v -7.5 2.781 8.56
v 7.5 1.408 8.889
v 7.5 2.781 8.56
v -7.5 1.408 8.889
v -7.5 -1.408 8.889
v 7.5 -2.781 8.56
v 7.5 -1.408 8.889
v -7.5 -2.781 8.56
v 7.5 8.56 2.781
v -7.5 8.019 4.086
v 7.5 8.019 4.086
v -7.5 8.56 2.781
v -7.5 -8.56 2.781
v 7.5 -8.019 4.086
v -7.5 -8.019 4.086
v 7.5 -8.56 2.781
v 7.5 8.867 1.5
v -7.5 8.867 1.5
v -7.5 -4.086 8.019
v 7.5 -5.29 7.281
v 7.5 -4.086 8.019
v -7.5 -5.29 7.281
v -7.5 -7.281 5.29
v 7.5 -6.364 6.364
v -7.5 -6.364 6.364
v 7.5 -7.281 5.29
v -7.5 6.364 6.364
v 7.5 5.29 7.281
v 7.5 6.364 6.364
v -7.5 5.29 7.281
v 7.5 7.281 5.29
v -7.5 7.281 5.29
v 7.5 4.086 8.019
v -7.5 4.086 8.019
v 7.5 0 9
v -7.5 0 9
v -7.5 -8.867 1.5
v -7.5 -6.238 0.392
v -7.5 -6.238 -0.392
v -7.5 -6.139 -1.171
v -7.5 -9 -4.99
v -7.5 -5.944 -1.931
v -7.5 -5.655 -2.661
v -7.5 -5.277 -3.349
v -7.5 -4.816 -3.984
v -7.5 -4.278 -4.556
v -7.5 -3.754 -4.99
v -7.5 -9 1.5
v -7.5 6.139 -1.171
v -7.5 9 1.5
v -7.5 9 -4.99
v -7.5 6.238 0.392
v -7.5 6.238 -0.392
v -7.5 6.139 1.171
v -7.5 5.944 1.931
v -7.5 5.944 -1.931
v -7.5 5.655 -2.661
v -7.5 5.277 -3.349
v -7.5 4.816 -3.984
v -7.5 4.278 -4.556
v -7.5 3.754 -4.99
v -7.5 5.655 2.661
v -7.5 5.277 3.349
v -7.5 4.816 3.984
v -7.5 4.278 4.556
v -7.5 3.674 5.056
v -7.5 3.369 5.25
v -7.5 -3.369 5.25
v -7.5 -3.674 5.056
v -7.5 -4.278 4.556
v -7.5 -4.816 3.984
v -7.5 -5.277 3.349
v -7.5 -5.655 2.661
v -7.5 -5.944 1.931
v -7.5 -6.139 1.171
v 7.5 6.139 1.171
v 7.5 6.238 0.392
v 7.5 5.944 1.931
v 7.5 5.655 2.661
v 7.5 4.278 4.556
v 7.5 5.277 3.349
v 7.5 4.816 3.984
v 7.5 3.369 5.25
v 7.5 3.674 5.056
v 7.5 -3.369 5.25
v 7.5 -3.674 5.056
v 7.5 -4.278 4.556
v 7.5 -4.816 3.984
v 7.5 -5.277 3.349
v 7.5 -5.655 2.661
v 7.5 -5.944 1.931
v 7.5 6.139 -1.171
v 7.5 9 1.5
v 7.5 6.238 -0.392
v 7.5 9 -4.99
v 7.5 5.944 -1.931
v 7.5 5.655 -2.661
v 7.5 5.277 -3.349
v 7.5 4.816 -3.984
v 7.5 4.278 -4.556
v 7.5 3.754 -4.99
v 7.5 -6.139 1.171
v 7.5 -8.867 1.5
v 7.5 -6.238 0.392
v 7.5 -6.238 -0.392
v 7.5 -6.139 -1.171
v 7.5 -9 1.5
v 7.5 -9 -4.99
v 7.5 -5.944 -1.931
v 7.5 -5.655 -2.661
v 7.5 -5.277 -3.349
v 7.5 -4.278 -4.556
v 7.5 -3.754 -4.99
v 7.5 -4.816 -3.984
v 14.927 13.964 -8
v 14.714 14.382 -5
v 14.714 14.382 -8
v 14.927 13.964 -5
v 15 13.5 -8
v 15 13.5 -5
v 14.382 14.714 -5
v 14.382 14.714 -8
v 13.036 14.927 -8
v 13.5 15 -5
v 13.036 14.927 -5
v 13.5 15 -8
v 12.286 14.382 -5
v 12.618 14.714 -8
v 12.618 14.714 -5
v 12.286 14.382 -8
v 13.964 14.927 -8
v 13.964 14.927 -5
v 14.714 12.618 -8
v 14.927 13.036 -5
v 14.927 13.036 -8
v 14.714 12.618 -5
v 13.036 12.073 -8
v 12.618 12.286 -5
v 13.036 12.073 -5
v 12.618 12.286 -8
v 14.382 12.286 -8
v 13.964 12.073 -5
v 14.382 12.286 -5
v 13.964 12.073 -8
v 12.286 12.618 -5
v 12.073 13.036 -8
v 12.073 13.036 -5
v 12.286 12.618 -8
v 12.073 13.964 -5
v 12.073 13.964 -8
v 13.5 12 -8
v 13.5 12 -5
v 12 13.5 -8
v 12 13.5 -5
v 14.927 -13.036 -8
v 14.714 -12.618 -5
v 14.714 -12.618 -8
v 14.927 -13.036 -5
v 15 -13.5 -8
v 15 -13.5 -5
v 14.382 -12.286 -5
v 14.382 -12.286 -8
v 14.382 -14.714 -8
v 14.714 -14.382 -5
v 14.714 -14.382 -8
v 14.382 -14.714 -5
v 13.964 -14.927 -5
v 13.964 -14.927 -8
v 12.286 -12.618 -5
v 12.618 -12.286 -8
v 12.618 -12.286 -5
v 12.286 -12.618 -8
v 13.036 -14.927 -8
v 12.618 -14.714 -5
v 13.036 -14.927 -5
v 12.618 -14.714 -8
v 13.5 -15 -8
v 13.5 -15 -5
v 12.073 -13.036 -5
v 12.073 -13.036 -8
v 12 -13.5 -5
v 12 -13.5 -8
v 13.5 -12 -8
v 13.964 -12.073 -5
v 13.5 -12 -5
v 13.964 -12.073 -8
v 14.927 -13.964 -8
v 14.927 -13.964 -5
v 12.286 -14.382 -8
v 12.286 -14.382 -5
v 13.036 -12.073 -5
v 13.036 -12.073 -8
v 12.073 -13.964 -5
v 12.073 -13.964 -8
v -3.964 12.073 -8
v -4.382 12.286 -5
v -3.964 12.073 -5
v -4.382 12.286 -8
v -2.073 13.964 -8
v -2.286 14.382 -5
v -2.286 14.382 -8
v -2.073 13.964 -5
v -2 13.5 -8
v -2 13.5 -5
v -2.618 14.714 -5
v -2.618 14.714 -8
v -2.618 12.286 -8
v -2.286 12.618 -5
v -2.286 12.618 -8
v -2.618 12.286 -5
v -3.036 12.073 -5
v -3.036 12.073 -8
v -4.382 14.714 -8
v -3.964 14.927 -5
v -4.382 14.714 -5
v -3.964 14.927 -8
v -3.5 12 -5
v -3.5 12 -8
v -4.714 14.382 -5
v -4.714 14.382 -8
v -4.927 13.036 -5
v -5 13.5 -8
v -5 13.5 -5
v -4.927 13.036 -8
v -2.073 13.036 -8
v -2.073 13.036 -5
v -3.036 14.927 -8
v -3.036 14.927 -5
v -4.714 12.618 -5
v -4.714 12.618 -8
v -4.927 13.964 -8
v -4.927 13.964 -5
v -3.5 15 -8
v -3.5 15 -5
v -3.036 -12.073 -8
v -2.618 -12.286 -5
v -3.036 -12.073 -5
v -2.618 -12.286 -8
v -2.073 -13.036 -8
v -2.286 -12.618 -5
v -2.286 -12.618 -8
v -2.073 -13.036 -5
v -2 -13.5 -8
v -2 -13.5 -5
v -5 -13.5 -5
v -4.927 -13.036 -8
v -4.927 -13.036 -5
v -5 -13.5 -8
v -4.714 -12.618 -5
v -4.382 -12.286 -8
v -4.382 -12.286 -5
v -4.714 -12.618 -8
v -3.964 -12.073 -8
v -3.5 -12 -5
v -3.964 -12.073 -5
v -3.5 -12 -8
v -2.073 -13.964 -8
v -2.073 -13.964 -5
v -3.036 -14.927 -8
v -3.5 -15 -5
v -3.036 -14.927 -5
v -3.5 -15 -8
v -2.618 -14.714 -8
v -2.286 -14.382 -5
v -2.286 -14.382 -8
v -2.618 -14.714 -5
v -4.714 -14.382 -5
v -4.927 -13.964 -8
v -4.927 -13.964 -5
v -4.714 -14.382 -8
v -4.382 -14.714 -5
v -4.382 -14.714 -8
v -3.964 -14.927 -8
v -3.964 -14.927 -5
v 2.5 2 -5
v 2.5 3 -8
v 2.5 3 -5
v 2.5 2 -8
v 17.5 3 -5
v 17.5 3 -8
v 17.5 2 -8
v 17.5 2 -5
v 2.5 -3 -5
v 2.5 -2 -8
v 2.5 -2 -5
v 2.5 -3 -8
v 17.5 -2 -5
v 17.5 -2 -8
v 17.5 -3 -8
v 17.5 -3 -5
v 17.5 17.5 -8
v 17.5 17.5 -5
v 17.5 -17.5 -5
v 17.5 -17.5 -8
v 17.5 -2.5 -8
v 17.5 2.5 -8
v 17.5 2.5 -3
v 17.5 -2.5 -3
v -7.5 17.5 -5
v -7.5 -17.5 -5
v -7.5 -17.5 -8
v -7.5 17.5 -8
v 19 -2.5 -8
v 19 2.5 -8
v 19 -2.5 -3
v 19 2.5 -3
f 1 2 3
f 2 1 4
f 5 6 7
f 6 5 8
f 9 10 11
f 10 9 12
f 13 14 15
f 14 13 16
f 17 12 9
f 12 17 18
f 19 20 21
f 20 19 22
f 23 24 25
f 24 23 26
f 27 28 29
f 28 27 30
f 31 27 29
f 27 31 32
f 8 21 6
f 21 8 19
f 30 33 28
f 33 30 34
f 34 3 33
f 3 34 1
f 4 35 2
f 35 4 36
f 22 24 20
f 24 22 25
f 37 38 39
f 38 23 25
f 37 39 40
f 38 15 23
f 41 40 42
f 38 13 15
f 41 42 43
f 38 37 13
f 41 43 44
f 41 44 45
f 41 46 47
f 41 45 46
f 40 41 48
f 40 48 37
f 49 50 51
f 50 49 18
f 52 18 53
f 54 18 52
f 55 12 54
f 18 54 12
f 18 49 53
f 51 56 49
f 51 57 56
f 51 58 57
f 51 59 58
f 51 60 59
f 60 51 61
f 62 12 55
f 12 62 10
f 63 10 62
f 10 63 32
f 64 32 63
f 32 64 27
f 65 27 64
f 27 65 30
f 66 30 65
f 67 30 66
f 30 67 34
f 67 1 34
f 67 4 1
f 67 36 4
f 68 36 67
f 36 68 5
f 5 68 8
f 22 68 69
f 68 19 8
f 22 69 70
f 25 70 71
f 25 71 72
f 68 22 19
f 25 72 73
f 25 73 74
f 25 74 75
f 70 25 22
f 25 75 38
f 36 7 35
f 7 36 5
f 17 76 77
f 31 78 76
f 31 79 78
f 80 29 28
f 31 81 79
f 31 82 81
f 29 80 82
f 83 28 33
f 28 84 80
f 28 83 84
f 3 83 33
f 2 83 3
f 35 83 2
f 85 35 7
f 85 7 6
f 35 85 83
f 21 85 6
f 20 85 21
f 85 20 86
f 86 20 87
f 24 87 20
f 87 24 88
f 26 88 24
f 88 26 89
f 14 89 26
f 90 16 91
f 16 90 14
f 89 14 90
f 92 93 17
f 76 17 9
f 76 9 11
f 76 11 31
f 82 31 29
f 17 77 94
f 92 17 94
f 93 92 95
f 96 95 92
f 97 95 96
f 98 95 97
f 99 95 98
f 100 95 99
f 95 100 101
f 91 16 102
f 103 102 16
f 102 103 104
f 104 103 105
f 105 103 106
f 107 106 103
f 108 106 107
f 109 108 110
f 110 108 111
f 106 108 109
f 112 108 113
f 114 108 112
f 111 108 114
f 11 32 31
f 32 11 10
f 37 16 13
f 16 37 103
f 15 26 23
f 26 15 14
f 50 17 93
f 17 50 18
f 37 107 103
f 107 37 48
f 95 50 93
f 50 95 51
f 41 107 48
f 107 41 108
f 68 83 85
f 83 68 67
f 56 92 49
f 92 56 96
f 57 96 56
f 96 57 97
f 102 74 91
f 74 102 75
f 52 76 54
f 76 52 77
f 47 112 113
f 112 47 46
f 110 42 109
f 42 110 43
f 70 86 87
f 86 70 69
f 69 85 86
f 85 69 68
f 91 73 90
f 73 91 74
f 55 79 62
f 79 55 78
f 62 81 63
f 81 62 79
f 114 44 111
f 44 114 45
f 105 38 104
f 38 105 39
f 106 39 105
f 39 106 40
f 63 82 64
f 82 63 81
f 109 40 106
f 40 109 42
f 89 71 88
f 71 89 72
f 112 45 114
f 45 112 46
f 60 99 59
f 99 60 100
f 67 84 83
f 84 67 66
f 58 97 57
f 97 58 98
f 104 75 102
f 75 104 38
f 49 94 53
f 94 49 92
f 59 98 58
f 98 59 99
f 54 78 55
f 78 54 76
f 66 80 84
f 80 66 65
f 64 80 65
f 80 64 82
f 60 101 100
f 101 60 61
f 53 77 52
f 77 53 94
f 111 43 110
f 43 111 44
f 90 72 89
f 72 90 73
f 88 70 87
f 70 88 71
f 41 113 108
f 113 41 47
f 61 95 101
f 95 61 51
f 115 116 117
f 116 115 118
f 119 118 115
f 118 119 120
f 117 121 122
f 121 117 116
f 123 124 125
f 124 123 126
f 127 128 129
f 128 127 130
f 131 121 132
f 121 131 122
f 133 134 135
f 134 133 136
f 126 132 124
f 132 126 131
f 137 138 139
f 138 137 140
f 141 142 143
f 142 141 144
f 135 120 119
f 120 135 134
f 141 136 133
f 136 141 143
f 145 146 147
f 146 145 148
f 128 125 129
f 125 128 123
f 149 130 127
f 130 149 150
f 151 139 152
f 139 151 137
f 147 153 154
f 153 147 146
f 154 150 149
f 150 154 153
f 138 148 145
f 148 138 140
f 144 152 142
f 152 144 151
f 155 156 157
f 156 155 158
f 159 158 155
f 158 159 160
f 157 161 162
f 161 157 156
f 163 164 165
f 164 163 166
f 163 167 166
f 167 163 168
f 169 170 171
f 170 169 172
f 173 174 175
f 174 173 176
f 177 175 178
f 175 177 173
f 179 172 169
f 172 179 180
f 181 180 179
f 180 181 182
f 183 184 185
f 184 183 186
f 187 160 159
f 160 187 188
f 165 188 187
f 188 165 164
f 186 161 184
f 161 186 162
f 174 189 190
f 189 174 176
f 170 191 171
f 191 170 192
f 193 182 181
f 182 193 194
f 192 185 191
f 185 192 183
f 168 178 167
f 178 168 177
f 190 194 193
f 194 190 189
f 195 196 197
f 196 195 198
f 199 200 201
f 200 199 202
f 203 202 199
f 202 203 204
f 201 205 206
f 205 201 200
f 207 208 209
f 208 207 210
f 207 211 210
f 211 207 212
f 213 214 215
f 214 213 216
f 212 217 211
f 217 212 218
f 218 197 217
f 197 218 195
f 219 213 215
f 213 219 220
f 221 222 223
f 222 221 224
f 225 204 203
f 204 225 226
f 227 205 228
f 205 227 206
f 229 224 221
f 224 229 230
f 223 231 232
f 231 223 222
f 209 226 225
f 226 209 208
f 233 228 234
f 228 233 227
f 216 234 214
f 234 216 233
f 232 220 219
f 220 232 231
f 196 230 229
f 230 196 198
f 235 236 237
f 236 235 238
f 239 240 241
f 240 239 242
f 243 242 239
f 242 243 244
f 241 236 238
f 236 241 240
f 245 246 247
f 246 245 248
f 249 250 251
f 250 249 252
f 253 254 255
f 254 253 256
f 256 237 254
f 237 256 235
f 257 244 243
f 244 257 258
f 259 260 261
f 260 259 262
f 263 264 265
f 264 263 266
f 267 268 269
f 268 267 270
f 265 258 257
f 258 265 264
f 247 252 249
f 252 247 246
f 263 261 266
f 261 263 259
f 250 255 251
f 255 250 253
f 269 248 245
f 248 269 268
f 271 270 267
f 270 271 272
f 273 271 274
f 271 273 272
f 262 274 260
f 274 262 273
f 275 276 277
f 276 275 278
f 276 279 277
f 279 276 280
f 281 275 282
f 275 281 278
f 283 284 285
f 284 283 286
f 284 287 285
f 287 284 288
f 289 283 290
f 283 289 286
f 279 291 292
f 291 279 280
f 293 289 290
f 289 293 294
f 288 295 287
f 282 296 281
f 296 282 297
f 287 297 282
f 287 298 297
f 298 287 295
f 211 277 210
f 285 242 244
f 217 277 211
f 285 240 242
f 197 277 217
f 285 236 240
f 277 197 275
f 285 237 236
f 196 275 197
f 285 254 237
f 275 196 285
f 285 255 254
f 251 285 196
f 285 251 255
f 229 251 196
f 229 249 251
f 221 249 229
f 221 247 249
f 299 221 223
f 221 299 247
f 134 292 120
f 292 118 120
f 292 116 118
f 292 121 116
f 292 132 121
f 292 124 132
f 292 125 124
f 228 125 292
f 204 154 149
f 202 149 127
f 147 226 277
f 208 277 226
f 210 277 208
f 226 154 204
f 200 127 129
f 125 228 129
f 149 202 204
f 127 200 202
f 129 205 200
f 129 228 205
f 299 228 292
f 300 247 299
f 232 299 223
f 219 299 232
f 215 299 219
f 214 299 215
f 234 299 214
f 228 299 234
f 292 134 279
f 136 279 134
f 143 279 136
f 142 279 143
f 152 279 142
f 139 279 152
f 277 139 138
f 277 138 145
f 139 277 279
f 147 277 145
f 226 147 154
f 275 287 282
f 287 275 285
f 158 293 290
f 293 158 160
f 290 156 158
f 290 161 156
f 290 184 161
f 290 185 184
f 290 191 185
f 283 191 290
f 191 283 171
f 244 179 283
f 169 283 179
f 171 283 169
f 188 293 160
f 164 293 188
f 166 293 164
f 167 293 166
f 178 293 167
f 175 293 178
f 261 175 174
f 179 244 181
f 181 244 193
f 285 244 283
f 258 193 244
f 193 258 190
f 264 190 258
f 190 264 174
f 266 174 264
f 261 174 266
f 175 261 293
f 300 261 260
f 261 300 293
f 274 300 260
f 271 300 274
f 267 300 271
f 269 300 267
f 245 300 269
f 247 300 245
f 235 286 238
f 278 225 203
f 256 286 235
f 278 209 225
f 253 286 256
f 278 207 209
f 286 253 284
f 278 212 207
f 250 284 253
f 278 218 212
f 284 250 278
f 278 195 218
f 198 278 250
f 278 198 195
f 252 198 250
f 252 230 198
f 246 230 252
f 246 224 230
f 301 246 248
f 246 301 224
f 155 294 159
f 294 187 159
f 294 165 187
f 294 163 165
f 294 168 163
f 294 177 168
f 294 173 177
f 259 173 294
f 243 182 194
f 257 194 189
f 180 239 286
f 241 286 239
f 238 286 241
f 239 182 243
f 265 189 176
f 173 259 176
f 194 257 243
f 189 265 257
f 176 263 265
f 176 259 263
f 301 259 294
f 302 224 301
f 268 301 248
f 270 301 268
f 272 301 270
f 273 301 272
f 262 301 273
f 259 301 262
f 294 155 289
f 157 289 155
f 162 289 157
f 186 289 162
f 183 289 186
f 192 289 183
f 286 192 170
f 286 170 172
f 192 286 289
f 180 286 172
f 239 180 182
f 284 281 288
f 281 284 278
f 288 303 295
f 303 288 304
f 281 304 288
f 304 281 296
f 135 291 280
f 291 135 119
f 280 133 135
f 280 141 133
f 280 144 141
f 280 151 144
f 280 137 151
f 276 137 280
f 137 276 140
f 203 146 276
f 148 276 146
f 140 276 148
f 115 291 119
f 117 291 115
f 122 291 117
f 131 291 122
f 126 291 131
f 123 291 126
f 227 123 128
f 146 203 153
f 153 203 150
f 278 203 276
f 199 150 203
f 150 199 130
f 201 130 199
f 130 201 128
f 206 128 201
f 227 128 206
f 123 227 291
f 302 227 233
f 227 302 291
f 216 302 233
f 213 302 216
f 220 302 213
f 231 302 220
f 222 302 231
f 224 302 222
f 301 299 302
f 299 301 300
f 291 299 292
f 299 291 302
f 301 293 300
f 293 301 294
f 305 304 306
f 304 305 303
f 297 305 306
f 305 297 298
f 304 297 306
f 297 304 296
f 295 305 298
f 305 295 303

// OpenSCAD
//===============================
//
//  No-tools micro motor mounts
//
//  Designed by Andrew Moore, May 2016
//      http://www.thingiverse.com/TacPar
//
//      For questions, suggestions, or whatever, 
//      please PM me through thingiverse.
//
//      This work is licensed under a Creative Commons 
//      Attribution-ShareAlike 4.0 International License.
//      http://creativecommons.org/licenses/by-sa/4.0/
//
//  This can be used with a variety of 12mm micro gear motors
//  Length dimensions may need to change to accomodate 
//  different gear ratios (particularly the Pololu 
//  1000:1 motors)
//
//  This design allows for a little slop in motor 
//  position.  You can always tighten that up with 
//  some shim stock after you insert the motor.
//
//  The mounting holes are arbitrarily set based on the plate dimensions
//  This could be improved.
//
//  If you use an encoder, you may have to solder it to the back of the 
//  motor after inserting the motor into the holder.
//===============================

//this is motor length without the gearbox
motor_length = 15;
//dimension for rounded sides on micro motor
motor_width = 12; 	
//flat sides on micro motor
motor_height = 10;
//length of the gear box not including the output shaft
gearbox_length = 10;

//wall thickness for the motor holder before tolerance losses
housing_thickness = 3;

//this defines how oversized the hole is for the motor
//this will reduce the effective housing thickness above
tolerance = 0.25;

plate_thickness = 3;
plate_width = 35;
plate_length = motor_length+gearbox_length;
tab_height = plate_thickness+2;
tab_width = 5;
tab_thickness = 1.5;

module MicroGearMotorMount()
{
	//backplate()
	difference()
	{
		positives();
		negatives();
	}
	//add ons in areas that were erased...
	
	//back plate
	translate([plate_length/2-motor_length/2,0,-(motor_height/2+plate_thickness/2)]) backplate();
	//gearbox tab ... stops motor from sliding forward
	translate([-motor_length/2+plate_length+tab_thickness/2,0,-motor_height+tab_height-.5]) cube([tab_thickness,tab_width,tab_height], center=true);

	module positives()
	{
		//motor holding ring
		rotate([0,90,0]) 
            translate([0,0,0]) 
            cylinder(r=motor_width/2+housing_thickness, h=motor_length, center=true, $fn=40);

		translate([0,0,-motor_height/2+plate_thickness]) 
            cube([motor_length,motor_width+2*housing_thickness,motor_height-plate_thickness], center=true);
	}

	module negatives()
	{
		//cut off cylinder below the mounting plate
		translate([0,0,-(motor_height/2+plate_thickness-0.01)]) 
            cube([100,100,2*plate_thickness], center=true);

		//keyed shaft
		rotate([0,90,0]) 
        translate([0,0,-motor_length/2-0.1]) keyshaft(); 
        //translate([0,0,-motor_height/4]) cube([motor_length+.1,motor_width+1,motor_height/2], center=true);
		
	}
    module keyshaft()
    {
        difference()
		{
			positives();
            negatives();
            
			
		}
        module positives()
        {
            cylinder(r=motor_width/2+tolerance, h=motor_length+1, $fn=50);
        }
        
        module negatives()
        {
            translate([-motor_height-tolerance,0,motor_length/2+tolerance]) cube([motor_height,motor_width,motor_length+2],center=true);
            translate([motor_height+tolerance,0,motor_length/2+tolerance]) cube([motor_height,motor_width,motor_length+2],center=true);
        }
    }
	module backplate()
	{
		difference()
		{
			positives();
			negatives();
		}
        
        module positives()
        {
            cube([plate_length,plate_width,plate_thickness],center=true);
        }
        module negatives()
        {
            mount_holes();
			tab_slots();
        }
        
		module mount_holes()
		{
			rotate([0,0,0]) 
                translate([plate_length/2-4,plate_width/2-4,0]) 
                cylinder(r=1.5, h=plate_thickness+1, $fn=20, center=true);
			rotate([0,0,0])
                translate([plate_length/2-4,-(plate_width/2-4),0]) 
                cylinder(r=1.5, h=plate_thickness+1, $fn=20, center=true);
			rotate([0,0,0])
                translate([-(plate_length/2-4),plate_width/2-4,0]) 
                cylinder(r=1.5, h=plate_thickness+1, $fn=20, center=true);
			rotate([0,0,0])
                translate([-(plate_length/2-4),-(plate_width/2-4),0]) 
                cylinder(r=1.5, h=plate_thickness+1, $fn=20, center=true);
			
		}
		module tab_slots()
		{
			translate([0.4*plate_length,tab_width/2, 0]) cube([plate_length,1,plate_thickness+1], center=true);
			translate([0.4*plate_length,-tab_width/2, 0]) cube([plate_length,1,plate_thickness+1], center=true);
		}
	}

	
}

MicroGearMotorMount();
